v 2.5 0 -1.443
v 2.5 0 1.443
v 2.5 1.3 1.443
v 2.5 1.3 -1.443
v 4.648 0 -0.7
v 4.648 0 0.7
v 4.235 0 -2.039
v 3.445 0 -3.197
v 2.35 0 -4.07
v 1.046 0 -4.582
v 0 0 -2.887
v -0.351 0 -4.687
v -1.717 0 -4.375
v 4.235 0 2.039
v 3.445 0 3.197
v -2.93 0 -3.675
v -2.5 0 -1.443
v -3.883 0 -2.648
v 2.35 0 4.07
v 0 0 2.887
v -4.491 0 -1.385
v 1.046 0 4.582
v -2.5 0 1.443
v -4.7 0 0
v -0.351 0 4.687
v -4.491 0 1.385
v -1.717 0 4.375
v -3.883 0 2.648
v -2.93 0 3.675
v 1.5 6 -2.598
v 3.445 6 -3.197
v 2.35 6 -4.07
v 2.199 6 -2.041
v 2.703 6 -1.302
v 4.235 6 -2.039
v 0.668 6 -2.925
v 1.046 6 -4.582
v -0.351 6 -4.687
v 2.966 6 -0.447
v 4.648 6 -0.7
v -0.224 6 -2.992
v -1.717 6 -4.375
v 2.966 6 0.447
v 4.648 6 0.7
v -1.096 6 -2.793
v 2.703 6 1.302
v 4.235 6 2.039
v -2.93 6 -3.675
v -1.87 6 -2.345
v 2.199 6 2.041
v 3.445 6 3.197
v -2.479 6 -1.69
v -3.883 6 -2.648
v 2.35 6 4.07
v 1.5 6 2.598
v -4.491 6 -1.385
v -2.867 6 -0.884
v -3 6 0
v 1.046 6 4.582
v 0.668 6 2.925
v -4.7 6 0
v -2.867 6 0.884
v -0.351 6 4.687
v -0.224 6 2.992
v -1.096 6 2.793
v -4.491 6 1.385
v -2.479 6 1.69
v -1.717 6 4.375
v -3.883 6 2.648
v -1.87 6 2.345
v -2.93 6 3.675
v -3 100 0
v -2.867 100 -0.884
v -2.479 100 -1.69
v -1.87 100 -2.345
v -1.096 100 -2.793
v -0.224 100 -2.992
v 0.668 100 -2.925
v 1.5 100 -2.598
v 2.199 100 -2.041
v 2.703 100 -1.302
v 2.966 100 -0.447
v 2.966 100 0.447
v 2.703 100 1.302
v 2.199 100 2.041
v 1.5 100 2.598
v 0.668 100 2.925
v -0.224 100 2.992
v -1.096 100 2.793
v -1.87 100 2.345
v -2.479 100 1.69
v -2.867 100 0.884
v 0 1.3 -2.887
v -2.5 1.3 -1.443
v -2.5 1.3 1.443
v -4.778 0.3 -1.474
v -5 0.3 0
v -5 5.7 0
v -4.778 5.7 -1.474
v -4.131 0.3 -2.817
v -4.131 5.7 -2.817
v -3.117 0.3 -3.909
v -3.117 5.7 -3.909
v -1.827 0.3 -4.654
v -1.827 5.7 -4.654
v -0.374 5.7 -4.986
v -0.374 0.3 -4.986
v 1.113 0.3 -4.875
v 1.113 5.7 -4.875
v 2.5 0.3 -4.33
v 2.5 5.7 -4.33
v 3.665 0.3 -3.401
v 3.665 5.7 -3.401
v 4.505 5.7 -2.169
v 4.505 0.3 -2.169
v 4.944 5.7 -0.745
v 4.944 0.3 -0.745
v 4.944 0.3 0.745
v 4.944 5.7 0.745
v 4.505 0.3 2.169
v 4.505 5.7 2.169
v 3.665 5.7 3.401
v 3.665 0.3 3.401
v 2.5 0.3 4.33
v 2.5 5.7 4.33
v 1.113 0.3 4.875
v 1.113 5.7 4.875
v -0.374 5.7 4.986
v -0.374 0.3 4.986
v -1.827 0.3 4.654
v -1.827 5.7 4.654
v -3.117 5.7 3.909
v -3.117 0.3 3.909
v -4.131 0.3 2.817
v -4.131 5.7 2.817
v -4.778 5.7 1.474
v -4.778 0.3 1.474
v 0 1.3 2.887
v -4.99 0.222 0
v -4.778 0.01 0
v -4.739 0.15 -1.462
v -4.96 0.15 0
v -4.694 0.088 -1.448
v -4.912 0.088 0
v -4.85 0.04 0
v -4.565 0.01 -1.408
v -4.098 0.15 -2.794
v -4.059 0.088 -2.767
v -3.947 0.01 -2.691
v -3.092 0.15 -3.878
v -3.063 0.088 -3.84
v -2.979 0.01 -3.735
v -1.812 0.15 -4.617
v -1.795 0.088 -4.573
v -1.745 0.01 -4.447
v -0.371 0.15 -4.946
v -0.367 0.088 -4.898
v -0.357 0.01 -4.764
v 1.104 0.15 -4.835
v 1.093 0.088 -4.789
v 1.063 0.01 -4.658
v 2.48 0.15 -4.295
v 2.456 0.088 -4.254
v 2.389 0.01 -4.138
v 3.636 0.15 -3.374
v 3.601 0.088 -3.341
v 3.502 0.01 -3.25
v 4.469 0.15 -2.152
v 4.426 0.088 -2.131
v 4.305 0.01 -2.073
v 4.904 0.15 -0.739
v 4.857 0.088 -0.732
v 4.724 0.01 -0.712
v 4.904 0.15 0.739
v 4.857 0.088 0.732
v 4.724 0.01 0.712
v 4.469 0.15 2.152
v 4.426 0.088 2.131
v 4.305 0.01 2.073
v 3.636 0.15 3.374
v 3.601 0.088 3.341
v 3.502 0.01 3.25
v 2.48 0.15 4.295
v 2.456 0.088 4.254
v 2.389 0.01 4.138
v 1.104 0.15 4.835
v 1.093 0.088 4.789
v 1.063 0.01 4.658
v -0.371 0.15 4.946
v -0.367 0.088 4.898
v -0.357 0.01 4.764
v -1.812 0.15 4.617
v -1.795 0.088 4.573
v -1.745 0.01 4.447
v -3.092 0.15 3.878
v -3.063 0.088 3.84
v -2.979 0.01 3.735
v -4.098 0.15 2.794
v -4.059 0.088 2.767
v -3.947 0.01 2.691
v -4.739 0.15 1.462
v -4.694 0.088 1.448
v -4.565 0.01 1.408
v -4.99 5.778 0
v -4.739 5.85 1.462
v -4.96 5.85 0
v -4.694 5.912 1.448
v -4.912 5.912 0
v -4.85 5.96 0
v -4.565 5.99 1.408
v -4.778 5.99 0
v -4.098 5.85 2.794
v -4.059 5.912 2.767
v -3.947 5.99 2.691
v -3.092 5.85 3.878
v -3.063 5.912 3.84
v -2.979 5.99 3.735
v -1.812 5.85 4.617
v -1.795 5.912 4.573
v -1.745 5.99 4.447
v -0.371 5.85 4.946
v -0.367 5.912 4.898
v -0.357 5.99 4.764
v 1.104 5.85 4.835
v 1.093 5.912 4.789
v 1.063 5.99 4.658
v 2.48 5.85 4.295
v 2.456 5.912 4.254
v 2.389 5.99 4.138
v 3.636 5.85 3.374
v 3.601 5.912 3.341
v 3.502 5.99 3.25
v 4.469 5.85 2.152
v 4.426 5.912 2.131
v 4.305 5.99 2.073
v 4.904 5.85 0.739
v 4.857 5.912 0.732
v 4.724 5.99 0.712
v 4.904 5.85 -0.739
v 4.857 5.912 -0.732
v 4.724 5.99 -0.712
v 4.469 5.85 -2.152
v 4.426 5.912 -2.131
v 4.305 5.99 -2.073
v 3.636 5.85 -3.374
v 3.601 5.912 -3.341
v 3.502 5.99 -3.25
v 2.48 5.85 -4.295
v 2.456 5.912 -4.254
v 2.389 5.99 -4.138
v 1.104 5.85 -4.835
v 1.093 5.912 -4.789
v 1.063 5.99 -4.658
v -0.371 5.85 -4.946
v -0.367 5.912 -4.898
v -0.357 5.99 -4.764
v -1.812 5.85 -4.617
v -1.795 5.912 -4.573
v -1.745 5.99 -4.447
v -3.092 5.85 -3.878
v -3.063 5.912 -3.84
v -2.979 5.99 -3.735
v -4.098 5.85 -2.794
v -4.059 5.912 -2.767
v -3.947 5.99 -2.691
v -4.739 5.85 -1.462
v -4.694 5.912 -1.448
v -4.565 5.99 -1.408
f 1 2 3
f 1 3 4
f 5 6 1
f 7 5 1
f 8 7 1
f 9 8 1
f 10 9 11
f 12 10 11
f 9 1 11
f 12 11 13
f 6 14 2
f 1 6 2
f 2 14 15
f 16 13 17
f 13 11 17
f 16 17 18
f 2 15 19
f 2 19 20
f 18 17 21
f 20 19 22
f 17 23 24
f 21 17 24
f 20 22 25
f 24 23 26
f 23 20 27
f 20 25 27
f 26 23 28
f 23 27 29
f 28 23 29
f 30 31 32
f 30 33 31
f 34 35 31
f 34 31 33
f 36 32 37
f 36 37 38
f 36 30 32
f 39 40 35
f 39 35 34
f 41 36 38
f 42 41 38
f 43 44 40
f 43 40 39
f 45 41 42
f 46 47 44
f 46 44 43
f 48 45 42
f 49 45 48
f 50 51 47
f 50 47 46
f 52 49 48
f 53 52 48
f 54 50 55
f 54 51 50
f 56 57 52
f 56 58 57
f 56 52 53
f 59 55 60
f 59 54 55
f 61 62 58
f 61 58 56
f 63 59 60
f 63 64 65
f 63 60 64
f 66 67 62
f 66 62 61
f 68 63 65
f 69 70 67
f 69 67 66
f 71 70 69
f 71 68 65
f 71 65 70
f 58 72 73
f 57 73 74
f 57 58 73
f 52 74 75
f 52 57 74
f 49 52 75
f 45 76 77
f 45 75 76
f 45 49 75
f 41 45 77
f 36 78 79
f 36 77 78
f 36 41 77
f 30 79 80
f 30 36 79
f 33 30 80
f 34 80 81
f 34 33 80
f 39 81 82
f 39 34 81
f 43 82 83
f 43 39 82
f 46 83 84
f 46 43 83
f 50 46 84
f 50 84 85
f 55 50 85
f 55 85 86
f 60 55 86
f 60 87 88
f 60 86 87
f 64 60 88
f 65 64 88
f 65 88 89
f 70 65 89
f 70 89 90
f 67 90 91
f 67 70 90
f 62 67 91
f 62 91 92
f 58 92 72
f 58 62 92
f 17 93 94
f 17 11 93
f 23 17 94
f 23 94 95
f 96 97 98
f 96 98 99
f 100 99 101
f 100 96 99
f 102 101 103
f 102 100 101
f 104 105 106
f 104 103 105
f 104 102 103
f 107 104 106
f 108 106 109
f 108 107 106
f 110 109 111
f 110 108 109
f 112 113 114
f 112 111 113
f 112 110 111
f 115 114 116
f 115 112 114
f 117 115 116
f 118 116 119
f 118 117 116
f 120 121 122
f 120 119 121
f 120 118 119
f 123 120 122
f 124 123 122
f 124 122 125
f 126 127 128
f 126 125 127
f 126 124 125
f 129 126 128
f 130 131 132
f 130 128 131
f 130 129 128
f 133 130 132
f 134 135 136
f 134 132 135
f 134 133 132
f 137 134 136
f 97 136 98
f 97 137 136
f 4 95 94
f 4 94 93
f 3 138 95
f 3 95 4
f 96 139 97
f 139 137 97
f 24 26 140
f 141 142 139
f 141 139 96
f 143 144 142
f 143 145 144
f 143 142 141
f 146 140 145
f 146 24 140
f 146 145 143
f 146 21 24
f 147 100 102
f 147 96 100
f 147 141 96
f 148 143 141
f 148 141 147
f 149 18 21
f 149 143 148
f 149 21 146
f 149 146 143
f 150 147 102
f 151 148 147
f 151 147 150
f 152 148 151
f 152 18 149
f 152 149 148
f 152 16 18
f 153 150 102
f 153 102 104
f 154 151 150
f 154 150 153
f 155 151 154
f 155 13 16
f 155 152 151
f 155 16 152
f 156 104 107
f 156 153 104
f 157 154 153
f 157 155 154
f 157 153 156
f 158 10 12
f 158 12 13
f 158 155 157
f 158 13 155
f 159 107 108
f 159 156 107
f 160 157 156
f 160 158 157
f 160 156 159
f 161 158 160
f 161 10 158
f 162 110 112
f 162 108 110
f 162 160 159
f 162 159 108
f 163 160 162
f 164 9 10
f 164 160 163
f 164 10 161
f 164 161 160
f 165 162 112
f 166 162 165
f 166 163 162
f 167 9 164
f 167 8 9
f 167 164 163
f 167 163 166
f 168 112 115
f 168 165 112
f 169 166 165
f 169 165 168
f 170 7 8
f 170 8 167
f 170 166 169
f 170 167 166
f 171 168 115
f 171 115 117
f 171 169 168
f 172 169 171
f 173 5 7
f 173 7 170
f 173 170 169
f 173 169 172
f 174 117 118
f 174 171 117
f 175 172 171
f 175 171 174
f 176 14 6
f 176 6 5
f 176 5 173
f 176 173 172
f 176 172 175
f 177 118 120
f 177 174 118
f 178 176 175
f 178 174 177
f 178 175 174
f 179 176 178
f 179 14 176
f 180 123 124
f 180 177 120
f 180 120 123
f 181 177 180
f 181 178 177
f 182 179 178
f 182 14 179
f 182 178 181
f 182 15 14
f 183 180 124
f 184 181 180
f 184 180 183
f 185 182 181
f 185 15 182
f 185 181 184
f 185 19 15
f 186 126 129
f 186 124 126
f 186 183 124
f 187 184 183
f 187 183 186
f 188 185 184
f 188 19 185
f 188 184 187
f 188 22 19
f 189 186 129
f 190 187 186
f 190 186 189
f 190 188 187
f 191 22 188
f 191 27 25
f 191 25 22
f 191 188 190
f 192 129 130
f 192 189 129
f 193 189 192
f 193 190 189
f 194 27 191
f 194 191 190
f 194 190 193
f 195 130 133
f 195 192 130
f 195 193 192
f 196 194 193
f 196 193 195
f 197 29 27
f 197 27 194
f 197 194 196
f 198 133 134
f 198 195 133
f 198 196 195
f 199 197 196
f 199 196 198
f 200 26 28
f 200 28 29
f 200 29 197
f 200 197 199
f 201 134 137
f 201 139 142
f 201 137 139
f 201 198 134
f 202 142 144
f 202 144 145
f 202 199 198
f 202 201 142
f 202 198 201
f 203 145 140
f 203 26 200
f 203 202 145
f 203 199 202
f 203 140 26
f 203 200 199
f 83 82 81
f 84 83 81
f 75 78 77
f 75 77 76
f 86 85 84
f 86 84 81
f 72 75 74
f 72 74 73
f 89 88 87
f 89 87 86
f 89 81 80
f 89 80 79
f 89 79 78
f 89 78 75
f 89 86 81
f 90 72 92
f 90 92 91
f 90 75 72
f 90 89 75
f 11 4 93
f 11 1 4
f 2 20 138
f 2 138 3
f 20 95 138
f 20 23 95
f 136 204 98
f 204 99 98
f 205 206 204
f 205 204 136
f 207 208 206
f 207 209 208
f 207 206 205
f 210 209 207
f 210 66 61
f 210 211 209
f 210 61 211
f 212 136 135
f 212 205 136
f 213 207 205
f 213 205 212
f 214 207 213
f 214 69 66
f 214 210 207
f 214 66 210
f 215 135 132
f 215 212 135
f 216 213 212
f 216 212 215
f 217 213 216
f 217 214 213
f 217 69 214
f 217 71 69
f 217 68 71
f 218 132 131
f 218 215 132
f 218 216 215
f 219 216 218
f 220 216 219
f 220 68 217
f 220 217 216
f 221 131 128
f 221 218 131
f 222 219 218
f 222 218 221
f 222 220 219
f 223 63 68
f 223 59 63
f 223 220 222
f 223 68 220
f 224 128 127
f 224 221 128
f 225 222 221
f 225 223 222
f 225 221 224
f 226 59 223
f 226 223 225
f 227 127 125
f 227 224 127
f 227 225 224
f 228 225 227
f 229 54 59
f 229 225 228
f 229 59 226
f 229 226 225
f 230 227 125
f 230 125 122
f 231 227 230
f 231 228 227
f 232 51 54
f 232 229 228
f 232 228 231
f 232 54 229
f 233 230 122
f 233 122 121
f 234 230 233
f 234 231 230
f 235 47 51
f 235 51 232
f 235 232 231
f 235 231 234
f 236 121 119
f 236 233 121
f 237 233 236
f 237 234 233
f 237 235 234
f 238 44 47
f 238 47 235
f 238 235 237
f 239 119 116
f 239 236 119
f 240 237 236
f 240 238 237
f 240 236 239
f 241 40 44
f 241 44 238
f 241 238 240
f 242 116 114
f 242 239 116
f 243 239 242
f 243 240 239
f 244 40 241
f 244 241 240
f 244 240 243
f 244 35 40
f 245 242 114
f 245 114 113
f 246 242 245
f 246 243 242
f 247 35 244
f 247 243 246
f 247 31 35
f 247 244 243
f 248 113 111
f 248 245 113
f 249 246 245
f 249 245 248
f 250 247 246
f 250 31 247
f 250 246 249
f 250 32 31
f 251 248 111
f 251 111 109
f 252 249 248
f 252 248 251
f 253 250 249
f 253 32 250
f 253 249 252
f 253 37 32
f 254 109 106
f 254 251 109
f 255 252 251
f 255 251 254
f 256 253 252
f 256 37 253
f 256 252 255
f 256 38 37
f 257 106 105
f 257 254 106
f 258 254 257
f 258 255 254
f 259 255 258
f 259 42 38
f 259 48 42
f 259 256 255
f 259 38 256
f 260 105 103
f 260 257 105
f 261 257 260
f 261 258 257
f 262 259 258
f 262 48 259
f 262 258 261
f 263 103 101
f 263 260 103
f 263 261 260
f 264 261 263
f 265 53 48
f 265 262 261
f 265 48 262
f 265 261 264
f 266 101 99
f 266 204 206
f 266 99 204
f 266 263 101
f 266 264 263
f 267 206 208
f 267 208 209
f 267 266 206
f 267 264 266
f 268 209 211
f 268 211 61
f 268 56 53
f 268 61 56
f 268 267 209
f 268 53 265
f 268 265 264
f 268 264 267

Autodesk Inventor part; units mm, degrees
ref_plane "YZ Plane" through (0, 0, 0) normal (1, 0, 0) x (0, 1, 0)
ref_plane "XZ Plane" through (0, 0, 0) normal (0, 1, 0) x (-1, 0, 0)
ref_plane "XY Plane" through (0, 0, 0) normal (0, 0, 1) x (1, 0, 0)
sketch "Sketch1" plane through (0, 0, 0) normal (0, 1, 0) x (-1, 0, 0)
  circle A0 centre (0, 0) radius 5
  circle A1 centre (0, 0) radius 3
  dimension "d0" = 10
  dimension "d1" = 6
extrude "Extrusion1" add sketch "Sketch1" along normal blind 100 contours A1
extrude "Extrusion2" add sketch "Sketch1" along normal blind 6
fillet "Fillet1" radius 0.3 1 edges at (5, 0, 0)
fillet "Fillet2" radius 0.3 1 edges at (5, 6, 0)
sketch "Sketch2" plane through (0, 0, 0) normal (0, -1, 0) x (1, 0, 0)
  line L0 (0, -2.8868) -> (-2.5, -1.4434)
  line L1 (-2.5, -1.4434) -> (-2.5, 1.4434)
  line L2 (-2.5, 1.4434) -> (0, 2.8868)
  line L3 (0, 2.8868) -> (2.5, 1.4434)
  line L4 (2.5, 1.4434) -> (2.5, -1.4434)
  line L5 (2.5, -1.4434) -> (0, -2.8868)
  point P0 (0, 0)
  point P1 (0, 0)
  dimension "d8" = 5
extrude "Extrusion3" cut sketch "Sketch2" against normal blind 1.3
thread "Thread1" size "M6x1" class "6g" standard "ISO Metric profile" length 27
properties part number "m6_bolt100mm"
